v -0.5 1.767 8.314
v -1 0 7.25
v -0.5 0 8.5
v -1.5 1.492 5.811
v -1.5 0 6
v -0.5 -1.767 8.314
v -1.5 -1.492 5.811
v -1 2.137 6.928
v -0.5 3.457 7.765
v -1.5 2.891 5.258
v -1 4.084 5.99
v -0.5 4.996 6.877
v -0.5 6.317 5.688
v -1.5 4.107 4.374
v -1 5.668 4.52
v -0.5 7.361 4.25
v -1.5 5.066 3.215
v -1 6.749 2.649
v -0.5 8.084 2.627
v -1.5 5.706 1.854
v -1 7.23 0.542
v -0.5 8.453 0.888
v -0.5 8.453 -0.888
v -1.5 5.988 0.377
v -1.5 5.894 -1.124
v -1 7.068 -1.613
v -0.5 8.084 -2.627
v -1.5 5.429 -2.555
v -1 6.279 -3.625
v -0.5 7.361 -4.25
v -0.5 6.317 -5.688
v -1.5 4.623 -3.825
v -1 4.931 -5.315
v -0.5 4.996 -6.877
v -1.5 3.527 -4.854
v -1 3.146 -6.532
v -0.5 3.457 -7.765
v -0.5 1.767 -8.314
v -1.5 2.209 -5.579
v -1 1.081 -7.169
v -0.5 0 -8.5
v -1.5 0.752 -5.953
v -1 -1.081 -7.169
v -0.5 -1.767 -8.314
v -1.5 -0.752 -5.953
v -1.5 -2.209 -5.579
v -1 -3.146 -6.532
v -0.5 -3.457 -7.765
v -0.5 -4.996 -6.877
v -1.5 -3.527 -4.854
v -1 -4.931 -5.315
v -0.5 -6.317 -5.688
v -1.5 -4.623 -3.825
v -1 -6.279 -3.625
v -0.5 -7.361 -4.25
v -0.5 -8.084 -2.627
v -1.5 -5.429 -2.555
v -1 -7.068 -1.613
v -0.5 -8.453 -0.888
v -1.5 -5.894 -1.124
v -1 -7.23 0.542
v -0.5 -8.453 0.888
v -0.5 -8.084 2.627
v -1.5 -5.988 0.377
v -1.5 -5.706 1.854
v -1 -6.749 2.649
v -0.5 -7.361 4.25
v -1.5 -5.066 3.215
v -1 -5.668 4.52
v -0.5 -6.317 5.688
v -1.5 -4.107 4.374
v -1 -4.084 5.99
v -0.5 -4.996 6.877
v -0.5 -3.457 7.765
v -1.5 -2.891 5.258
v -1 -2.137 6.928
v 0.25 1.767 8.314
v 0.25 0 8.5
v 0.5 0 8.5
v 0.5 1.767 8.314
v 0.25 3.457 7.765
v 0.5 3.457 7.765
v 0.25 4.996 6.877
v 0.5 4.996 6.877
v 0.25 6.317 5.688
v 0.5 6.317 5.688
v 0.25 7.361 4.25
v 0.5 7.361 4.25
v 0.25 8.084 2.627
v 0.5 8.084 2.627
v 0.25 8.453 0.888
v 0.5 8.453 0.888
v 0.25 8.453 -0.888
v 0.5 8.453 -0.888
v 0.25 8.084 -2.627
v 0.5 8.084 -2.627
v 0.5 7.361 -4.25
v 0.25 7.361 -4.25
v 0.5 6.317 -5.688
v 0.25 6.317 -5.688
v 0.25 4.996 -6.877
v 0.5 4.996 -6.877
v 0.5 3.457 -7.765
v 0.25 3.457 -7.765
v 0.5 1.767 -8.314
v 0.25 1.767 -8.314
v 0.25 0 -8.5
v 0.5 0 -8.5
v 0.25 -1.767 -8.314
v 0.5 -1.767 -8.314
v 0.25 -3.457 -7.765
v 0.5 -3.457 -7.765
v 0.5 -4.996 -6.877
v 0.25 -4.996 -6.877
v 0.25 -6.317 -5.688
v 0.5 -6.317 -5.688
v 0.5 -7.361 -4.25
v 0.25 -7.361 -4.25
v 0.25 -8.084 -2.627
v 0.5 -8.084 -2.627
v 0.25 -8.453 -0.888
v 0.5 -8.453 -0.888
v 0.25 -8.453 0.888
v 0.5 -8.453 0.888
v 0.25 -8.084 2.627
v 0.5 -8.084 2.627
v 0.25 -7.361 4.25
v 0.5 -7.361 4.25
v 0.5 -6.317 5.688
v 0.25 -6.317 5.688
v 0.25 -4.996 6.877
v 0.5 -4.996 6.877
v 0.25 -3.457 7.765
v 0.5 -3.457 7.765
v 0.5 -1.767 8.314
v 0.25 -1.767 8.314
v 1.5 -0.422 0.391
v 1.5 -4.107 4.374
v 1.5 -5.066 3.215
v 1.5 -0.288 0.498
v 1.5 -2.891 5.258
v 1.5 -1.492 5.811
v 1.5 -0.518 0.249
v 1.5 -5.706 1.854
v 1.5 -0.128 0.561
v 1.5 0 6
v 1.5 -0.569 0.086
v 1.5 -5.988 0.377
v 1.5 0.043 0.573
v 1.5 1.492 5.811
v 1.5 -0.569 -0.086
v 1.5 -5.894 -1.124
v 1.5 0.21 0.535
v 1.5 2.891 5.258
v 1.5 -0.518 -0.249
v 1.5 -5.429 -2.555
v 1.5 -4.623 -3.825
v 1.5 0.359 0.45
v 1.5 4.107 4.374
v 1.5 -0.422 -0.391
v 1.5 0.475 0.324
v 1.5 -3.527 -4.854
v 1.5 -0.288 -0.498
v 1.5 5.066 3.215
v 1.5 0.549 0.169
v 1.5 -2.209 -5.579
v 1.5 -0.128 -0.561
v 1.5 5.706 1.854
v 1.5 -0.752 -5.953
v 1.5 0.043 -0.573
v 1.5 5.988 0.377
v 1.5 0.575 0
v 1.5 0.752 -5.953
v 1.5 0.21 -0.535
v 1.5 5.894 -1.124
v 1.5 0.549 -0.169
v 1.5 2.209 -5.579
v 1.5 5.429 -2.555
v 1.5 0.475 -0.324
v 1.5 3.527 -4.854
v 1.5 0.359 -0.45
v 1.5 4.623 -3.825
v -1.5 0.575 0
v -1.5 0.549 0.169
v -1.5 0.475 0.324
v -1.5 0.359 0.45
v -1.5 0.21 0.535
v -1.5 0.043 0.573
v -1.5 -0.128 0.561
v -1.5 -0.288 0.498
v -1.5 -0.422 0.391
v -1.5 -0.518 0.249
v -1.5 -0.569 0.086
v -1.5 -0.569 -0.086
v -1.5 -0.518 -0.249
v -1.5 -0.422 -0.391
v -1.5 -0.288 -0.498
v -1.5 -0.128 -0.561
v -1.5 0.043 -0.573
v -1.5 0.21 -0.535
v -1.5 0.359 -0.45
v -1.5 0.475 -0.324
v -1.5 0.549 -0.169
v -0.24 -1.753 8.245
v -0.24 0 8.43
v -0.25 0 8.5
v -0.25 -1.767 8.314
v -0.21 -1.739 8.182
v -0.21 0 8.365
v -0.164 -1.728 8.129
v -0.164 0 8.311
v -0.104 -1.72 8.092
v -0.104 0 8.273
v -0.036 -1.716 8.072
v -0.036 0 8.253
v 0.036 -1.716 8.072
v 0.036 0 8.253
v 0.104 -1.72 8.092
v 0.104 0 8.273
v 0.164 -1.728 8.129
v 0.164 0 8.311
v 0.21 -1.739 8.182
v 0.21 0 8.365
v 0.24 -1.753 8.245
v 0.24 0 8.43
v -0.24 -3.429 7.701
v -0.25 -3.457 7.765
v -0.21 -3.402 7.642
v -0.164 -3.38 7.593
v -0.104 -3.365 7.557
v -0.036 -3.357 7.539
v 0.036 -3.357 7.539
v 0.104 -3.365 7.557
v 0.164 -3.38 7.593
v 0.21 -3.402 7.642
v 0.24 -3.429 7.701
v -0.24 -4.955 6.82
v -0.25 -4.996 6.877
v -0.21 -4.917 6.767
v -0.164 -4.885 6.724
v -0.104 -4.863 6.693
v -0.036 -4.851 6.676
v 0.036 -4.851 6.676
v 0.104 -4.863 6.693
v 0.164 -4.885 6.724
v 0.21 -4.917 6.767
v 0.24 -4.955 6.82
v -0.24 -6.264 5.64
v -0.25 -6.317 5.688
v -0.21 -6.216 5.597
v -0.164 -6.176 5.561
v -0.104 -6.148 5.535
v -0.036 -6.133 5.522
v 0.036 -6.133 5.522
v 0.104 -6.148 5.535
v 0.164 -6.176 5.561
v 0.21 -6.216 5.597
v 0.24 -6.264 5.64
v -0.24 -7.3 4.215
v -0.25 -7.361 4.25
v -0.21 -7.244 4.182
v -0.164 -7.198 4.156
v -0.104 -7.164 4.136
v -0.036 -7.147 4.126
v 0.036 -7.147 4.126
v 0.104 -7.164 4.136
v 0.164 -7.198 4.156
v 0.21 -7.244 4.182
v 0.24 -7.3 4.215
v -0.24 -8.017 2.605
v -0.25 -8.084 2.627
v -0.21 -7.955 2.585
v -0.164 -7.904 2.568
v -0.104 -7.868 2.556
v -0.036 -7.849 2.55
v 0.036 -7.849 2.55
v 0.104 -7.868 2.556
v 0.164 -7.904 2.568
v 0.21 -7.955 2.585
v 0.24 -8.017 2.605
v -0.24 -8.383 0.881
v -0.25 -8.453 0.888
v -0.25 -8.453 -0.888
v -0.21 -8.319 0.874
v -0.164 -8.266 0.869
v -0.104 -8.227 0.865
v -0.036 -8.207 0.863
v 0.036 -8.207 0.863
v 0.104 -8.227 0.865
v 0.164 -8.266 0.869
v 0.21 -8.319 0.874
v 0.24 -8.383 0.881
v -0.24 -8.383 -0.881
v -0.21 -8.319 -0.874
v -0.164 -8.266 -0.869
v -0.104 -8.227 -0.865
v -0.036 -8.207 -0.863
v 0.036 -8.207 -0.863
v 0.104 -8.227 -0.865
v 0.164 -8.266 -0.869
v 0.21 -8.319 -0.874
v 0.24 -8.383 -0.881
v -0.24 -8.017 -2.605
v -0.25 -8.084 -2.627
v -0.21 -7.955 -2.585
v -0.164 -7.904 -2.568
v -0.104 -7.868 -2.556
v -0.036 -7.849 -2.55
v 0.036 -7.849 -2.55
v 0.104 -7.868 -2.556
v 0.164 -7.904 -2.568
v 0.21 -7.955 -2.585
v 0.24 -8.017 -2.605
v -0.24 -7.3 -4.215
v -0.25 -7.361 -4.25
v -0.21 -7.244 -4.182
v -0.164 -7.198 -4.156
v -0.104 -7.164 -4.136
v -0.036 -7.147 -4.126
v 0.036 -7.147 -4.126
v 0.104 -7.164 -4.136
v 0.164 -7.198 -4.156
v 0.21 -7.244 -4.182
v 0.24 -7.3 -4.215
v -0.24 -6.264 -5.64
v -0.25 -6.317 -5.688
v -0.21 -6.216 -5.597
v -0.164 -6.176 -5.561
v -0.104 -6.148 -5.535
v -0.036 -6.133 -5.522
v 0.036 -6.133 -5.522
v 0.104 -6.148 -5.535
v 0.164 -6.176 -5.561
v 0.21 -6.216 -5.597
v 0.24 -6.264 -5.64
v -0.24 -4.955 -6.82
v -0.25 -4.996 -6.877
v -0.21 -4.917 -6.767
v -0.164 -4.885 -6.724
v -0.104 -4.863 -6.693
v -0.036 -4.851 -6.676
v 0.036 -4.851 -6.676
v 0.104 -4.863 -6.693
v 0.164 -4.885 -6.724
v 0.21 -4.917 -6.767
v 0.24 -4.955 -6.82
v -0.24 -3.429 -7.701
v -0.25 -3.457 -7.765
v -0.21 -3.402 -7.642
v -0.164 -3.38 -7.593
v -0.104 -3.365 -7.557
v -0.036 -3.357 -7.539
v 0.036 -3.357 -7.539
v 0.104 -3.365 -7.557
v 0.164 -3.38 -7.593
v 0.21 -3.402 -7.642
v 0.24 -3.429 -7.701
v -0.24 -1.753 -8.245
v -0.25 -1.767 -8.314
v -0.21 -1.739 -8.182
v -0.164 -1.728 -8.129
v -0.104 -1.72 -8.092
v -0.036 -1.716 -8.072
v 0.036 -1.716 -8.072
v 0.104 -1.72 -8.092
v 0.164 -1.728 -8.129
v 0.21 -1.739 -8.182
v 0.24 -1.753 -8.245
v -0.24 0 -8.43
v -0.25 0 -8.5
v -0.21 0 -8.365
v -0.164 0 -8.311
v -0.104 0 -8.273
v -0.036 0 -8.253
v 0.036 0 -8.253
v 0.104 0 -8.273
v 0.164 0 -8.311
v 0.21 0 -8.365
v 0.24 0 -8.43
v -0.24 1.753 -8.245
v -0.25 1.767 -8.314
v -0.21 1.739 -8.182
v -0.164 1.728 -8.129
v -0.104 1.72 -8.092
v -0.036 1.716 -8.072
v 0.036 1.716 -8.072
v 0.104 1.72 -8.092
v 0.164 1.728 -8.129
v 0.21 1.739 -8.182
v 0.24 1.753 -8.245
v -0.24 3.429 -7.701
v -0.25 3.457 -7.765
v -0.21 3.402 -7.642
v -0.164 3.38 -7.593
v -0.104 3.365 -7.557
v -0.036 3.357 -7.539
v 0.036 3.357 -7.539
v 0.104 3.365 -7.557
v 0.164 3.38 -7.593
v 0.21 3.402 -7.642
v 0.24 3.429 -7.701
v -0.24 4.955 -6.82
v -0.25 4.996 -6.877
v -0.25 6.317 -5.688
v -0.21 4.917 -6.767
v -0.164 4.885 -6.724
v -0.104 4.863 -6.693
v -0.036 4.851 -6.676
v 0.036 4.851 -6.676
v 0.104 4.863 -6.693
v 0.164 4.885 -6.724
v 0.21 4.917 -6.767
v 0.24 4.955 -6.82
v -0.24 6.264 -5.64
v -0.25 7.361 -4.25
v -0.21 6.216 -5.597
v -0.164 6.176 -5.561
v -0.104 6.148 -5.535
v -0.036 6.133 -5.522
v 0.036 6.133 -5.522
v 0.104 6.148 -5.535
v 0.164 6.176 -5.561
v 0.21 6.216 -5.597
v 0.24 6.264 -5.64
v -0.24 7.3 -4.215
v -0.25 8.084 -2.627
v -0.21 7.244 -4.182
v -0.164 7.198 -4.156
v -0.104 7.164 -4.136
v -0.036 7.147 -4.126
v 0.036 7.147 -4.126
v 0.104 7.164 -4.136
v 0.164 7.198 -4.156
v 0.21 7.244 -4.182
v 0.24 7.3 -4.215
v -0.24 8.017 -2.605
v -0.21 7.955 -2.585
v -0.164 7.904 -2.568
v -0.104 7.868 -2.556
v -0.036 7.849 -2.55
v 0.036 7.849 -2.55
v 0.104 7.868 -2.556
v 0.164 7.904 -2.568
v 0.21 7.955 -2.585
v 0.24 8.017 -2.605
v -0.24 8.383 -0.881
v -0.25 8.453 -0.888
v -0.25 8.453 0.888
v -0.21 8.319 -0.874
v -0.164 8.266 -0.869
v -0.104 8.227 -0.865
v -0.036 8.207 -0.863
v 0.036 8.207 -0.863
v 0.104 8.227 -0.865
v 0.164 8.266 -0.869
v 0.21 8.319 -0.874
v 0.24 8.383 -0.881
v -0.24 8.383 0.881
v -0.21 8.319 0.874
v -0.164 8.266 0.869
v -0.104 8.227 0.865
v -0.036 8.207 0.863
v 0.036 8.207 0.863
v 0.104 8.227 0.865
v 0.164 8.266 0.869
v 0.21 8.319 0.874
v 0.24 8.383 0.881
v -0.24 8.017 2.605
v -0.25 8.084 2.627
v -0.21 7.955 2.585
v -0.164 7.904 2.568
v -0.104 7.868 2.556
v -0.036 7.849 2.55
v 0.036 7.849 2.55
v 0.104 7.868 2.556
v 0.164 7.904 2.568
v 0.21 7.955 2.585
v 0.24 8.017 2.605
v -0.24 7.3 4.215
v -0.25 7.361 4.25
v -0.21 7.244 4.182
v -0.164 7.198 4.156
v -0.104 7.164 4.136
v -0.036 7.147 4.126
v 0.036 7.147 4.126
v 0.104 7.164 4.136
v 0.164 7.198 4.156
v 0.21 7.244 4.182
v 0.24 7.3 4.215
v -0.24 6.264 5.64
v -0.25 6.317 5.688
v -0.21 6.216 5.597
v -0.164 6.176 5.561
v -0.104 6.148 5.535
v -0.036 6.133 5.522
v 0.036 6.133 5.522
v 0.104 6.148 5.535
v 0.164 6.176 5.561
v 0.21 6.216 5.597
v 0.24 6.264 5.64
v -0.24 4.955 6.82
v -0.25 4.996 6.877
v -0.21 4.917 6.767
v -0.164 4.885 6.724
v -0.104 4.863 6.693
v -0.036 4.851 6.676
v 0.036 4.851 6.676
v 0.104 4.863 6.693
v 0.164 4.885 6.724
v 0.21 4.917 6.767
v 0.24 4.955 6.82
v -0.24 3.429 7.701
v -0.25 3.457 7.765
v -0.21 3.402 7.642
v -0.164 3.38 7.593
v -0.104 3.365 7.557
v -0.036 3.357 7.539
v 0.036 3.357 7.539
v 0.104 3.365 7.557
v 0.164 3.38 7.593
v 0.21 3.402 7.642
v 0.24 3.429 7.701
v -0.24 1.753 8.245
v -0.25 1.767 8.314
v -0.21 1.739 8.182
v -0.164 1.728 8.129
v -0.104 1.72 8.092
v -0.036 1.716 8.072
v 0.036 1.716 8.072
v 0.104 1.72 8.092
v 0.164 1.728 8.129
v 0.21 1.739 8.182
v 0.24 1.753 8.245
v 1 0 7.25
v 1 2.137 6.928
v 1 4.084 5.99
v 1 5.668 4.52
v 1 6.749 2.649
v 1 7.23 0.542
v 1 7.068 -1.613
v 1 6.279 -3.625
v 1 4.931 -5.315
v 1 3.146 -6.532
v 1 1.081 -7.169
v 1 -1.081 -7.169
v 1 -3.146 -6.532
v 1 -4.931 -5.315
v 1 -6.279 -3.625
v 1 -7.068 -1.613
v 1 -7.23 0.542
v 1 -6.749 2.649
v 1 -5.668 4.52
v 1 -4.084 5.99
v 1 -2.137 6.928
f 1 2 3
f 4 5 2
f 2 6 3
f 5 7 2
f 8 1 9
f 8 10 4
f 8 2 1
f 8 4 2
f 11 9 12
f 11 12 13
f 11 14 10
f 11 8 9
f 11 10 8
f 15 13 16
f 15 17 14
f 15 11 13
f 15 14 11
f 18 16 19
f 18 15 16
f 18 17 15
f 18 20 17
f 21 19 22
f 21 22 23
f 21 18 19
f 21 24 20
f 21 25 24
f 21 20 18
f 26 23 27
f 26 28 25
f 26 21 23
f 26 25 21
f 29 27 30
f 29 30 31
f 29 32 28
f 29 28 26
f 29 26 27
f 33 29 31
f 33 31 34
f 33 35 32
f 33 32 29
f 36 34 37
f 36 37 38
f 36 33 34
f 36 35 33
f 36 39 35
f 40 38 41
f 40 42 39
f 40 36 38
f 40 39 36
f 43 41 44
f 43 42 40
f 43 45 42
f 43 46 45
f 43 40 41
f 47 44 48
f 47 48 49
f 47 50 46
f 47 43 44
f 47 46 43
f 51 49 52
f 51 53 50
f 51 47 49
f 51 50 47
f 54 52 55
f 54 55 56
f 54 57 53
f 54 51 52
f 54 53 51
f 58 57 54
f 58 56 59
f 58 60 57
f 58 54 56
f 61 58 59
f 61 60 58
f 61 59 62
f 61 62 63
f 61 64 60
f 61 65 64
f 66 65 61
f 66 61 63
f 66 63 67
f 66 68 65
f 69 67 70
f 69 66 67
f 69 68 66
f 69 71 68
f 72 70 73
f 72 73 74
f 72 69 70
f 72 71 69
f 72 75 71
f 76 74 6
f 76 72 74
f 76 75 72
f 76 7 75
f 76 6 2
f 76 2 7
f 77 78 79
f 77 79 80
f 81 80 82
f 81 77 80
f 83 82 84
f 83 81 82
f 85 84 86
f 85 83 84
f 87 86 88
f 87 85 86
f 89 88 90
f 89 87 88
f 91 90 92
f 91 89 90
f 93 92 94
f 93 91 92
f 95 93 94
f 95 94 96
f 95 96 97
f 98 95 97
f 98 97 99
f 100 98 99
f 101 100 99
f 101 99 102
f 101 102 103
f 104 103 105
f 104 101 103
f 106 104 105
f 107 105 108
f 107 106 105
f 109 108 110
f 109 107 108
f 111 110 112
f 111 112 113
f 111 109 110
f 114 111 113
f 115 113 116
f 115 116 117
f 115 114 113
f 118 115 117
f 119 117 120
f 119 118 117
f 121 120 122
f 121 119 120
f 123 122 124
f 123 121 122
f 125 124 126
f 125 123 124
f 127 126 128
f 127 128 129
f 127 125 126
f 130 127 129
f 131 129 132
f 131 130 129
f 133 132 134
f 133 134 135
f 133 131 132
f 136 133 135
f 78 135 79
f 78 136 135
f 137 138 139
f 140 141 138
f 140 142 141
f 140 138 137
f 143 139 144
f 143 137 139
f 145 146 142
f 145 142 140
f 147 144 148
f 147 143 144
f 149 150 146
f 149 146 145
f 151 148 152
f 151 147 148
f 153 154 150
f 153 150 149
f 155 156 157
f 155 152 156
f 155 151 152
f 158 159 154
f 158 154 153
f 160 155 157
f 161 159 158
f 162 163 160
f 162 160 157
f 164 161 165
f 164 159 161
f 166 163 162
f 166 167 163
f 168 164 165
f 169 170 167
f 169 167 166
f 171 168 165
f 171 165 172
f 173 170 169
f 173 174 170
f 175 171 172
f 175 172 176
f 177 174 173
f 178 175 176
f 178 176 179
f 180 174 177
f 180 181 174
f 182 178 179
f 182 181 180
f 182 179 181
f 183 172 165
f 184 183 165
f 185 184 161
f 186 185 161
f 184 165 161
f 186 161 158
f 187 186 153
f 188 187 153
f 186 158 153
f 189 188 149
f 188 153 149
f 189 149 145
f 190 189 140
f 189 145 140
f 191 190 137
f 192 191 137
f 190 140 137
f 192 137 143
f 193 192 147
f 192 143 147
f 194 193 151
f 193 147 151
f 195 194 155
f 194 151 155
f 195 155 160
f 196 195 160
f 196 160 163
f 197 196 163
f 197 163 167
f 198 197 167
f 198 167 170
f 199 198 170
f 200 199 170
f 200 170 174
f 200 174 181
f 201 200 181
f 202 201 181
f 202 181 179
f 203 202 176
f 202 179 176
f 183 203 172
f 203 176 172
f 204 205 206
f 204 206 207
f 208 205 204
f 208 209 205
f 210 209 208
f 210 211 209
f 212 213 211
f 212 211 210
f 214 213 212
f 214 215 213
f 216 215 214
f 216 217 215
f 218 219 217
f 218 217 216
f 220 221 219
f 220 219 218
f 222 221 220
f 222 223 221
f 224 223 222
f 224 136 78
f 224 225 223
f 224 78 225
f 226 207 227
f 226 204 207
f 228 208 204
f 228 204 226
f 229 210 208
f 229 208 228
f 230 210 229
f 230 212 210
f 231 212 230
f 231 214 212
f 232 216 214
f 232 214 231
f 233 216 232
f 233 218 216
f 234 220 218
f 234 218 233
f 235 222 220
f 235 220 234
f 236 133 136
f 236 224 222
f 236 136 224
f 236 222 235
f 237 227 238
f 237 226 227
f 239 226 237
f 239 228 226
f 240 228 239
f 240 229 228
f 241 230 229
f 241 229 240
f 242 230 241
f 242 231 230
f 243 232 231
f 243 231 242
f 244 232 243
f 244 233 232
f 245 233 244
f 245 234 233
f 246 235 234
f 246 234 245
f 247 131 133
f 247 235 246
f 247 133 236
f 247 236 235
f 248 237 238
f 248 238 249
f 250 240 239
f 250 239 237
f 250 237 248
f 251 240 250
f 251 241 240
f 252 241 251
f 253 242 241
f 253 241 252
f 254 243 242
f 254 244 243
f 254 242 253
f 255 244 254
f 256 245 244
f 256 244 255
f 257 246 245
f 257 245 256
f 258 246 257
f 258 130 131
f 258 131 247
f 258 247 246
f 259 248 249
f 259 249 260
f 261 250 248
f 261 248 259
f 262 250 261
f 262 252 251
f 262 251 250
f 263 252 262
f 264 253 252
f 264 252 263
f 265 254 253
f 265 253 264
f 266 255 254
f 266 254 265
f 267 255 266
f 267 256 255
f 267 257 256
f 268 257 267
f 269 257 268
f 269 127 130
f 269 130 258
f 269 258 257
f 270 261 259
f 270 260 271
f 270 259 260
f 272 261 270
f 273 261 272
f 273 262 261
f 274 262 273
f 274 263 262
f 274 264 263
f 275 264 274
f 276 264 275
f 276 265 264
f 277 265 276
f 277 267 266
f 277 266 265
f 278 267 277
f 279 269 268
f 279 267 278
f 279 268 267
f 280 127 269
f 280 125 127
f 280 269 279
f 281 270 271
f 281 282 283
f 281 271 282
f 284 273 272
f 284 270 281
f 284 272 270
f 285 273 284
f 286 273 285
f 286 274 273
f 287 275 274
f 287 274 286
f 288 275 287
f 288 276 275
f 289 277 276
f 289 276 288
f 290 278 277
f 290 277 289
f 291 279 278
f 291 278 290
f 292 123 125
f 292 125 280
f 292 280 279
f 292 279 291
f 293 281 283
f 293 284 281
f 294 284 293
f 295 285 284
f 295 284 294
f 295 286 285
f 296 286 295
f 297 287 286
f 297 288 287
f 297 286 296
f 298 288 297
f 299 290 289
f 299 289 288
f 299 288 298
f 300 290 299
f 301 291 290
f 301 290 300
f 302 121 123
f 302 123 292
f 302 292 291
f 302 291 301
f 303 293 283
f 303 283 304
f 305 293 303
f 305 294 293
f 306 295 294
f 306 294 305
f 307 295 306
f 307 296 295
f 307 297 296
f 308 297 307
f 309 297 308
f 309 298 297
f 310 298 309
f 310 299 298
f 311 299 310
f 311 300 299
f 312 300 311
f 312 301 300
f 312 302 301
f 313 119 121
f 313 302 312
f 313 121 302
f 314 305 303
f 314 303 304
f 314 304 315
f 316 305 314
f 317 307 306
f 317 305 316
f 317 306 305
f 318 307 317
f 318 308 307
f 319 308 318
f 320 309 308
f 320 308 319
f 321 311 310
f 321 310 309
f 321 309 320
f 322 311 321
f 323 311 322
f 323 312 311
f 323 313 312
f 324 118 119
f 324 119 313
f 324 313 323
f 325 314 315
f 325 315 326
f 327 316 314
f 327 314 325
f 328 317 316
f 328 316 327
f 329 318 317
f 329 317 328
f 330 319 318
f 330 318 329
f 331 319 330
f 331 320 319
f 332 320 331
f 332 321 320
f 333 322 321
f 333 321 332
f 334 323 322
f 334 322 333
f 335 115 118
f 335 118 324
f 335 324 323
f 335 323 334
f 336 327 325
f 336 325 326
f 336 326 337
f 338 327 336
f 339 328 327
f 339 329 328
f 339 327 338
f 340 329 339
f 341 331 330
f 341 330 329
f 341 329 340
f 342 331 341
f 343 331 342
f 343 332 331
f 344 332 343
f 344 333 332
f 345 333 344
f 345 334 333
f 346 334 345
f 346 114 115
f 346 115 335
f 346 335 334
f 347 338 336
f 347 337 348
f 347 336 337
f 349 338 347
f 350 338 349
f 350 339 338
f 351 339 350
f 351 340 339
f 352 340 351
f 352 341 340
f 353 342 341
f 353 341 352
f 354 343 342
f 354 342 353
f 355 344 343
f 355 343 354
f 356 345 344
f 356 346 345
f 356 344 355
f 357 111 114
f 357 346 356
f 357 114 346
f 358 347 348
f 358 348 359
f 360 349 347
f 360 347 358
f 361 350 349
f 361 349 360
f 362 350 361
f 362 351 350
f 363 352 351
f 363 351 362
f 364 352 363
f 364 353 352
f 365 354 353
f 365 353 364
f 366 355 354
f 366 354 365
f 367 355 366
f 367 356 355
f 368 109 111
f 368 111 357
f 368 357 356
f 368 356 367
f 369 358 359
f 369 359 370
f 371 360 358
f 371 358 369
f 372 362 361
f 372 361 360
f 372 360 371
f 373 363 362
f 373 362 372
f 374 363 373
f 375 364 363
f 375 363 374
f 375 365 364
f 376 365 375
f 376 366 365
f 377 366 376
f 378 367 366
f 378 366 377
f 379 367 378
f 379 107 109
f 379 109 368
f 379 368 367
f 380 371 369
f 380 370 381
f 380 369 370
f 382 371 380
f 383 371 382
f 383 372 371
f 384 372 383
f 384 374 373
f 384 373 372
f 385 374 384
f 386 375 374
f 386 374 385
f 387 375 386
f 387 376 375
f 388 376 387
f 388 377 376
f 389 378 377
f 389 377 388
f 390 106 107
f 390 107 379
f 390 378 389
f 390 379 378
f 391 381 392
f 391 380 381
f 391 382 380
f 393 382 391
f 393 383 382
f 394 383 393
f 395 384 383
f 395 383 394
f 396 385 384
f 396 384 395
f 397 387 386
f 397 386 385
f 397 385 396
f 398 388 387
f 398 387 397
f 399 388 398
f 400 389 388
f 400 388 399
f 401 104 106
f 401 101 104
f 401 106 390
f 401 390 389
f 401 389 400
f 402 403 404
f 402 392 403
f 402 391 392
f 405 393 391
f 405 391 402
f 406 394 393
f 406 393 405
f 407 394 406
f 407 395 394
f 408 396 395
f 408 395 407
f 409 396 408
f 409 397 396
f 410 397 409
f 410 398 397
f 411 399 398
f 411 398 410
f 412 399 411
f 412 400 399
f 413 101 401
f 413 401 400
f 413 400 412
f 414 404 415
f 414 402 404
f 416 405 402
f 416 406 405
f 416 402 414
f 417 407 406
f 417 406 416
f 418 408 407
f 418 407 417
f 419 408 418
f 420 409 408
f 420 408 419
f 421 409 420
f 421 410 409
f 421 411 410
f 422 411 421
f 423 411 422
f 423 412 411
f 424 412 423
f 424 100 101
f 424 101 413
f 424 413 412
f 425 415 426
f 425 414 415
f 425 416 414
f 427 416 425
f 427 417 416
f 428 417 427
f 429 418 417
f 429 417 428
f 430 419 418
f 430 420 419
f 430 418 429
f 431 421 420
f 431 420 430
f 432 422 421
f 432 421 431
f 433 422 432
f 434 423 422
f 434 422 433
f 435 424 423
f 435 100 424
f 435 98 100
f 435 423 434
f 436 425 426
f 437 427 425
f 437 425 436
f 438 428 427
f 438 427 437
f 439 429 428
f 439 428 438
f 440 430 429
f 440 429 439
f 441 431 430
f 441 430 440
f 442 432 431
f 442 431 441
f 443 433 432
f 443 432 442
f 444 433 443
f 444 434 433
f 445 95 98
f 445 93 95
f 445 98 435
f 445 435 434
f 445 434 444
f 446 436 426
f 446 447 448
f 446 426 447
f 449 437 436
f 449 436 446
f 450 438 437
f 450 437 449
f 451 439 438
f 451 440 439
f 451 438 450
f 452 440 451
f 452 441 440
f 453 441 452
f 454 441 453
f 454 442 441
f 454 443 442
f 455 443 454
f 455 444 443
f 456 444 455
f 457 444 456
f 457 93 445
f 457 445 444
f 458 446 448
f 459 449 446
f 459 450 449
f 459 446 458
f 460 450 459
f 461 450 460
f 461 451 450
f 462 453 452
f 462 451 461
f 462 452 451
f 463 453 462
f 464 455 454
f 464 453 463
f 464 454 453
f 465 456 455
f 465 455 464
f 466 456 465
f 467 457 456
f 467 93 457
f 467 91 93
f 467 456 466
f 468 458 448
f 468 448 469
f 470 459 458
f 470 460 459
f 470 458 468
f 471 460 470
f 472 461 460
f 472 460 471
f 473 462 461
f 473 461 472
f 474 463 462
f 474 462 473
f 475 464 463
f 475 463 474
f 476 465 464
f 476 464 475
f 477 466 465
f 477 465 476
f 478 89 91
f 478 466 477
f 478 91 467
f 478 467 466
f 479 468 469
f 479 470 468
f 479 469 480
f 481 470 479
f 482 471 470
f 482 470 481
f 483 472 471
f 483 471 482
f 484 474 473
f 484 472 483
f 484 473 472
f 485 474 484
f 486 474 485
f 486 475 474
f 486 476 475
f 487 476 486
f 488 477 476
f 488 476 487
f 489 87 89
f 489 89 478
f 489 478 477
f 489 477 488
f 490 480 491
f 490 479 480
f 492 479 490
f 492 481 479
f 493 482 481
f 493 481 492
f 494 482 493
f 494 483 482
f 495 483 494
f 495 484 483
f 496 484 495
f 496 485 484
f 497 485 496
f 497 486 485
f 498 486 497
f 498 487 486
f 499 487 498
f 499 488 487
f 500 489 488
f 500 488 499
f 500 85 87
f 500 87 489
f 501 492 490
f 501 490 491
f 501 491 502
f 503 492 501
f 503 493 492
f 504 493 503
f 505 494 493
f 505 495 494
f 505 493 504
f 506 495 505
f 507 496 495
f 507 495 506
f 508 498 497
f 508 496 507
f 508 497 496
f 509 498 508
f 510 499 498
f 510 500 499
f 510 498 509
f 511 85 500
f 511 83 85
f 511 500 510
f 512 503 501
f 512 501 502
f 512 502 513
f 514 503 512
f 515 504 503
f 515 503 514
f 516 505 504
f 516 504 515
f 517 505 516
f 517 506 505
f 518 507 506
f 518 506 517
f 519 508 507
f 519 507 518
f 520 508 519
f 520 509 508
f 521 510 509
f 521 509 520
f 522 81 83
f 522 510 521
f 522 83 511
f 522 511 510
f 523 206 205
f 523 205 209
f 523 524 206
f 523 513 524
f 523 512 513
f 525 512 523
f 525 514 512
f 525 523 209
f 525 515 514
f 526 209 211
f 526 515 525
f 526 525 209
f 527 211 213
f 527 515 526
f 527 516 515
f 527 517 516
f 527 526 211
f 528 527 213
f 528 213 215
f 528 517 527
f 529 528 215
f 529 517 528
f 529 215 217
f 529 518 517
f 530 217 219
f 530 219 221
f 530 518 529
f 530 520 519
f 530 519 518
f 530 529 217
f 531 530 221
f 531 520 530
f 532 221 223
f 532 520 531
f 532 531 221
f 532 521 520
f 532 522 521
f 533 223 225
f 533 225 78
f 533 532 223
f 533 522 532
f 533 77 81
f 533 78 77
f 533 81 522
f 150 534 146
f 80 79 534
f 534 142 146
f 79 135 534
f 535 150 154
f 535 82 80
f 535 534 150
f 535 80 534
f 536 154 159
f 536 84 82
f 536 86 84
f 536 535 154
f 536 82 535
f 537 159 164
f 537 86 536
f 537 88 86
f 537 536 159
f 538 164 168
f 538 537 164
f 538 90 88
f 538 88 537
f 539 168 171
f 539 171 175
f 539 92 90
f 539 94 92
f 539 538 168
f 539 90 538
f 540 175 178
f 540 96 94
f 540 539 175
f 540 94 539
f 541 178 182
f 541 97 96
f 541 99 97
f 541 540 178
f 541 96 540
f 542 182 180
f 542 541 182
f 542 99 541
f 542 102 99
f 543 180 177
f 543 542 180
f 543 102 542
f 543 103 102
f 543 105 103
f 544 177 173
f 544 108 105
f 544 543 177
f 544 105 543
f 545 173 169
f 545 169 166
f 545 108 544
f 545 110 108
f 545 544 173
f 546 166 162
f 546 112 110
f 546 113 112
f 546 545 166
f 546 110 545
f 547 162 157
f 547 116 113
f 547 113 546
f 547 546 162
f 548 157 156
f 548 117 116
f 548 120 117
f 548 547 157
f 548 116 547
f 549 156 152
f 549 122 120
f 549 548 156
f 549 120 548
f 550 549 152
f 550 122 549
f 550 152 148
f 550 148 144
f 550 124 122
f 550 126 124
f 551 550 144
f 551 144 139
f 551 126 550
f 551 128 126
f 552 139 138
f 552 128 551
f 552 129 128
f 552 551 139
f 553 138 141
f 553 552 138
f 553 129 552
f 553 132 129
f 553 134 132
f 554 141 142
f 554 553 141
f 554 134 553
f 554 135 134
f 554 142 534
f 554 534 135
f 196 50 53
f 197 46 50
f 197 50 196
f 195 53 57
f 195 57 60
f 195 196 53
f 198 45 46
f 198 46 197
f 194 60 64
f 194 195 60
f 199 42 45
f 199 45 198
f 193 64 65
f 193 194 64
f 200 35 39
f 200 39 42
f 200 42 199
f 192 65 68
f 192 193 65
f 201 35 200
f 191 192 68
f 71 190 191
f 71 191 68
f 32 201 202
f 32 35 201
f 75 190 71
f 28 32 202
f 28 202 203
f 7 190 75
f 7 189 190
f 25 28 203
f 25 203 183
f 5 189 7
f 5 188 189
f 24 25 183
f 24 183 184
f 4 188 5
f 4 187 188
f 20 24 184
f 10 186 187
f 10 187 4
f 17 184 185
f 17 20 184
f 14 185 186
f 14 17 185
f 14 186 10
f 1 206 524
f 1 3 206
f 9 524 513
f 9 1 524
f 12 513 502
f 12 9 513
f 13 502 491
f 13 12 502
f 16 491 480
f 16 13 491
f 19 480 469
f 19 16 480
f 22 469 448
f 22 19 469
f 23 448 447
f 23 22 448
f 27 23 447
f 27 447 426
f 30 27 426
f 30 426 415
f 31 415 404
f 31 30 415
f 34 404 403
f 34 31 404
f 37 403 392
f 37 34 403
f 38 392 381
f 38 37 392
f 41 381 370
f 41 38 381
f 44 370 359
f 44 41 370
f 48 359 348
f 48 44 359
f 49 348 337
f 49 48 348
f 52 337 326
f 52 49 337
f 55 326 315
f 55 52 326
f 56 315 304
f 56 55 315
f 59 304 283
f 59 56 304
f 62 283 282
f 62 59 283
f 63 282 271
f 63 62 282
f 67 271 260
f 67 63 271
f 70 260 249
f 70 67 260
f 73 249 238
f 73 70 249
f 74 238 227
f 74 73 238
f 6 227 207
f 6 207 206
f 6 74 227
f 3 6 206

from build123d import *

# Parameters (mm, degrees)
F2_R     = 0.25
F4_R     = 0.575
F5_DEPTH = 3


with BuildPart() as f1:
    # F0 (on Front) → F1 (revolve)
    with BuildSketch(Plane.XZ):
        Polygon((-1.5, 0), (1.5, 0), (1.5, 6), (0.5, 8.5), (-0.5, 8.5), (-1.5, 6), align=None)
    revolve(axis=Axis((0, 0, 0), (-1, 0, 0)))

    # F2 (on Front) → F3 (revolve, cut)
    with BuildSketch(Plane.XZ):
        with Locations((0, 8.5)):
            Circle(F2_R)
    revolve(axis=Axis((0.73948, 0, 0), (1, 0, 0)), mode=Mode.SUBTRACT)

    # F4 (on face) → F5 (cut, through all)
    with BuildSketch(Plane.YZ.offset(1.5)):
        Circle(F4_R)
    extrude(amount=-F5_DEPTH, mode=Mode.SUBTRACT)


solid = f1.part
